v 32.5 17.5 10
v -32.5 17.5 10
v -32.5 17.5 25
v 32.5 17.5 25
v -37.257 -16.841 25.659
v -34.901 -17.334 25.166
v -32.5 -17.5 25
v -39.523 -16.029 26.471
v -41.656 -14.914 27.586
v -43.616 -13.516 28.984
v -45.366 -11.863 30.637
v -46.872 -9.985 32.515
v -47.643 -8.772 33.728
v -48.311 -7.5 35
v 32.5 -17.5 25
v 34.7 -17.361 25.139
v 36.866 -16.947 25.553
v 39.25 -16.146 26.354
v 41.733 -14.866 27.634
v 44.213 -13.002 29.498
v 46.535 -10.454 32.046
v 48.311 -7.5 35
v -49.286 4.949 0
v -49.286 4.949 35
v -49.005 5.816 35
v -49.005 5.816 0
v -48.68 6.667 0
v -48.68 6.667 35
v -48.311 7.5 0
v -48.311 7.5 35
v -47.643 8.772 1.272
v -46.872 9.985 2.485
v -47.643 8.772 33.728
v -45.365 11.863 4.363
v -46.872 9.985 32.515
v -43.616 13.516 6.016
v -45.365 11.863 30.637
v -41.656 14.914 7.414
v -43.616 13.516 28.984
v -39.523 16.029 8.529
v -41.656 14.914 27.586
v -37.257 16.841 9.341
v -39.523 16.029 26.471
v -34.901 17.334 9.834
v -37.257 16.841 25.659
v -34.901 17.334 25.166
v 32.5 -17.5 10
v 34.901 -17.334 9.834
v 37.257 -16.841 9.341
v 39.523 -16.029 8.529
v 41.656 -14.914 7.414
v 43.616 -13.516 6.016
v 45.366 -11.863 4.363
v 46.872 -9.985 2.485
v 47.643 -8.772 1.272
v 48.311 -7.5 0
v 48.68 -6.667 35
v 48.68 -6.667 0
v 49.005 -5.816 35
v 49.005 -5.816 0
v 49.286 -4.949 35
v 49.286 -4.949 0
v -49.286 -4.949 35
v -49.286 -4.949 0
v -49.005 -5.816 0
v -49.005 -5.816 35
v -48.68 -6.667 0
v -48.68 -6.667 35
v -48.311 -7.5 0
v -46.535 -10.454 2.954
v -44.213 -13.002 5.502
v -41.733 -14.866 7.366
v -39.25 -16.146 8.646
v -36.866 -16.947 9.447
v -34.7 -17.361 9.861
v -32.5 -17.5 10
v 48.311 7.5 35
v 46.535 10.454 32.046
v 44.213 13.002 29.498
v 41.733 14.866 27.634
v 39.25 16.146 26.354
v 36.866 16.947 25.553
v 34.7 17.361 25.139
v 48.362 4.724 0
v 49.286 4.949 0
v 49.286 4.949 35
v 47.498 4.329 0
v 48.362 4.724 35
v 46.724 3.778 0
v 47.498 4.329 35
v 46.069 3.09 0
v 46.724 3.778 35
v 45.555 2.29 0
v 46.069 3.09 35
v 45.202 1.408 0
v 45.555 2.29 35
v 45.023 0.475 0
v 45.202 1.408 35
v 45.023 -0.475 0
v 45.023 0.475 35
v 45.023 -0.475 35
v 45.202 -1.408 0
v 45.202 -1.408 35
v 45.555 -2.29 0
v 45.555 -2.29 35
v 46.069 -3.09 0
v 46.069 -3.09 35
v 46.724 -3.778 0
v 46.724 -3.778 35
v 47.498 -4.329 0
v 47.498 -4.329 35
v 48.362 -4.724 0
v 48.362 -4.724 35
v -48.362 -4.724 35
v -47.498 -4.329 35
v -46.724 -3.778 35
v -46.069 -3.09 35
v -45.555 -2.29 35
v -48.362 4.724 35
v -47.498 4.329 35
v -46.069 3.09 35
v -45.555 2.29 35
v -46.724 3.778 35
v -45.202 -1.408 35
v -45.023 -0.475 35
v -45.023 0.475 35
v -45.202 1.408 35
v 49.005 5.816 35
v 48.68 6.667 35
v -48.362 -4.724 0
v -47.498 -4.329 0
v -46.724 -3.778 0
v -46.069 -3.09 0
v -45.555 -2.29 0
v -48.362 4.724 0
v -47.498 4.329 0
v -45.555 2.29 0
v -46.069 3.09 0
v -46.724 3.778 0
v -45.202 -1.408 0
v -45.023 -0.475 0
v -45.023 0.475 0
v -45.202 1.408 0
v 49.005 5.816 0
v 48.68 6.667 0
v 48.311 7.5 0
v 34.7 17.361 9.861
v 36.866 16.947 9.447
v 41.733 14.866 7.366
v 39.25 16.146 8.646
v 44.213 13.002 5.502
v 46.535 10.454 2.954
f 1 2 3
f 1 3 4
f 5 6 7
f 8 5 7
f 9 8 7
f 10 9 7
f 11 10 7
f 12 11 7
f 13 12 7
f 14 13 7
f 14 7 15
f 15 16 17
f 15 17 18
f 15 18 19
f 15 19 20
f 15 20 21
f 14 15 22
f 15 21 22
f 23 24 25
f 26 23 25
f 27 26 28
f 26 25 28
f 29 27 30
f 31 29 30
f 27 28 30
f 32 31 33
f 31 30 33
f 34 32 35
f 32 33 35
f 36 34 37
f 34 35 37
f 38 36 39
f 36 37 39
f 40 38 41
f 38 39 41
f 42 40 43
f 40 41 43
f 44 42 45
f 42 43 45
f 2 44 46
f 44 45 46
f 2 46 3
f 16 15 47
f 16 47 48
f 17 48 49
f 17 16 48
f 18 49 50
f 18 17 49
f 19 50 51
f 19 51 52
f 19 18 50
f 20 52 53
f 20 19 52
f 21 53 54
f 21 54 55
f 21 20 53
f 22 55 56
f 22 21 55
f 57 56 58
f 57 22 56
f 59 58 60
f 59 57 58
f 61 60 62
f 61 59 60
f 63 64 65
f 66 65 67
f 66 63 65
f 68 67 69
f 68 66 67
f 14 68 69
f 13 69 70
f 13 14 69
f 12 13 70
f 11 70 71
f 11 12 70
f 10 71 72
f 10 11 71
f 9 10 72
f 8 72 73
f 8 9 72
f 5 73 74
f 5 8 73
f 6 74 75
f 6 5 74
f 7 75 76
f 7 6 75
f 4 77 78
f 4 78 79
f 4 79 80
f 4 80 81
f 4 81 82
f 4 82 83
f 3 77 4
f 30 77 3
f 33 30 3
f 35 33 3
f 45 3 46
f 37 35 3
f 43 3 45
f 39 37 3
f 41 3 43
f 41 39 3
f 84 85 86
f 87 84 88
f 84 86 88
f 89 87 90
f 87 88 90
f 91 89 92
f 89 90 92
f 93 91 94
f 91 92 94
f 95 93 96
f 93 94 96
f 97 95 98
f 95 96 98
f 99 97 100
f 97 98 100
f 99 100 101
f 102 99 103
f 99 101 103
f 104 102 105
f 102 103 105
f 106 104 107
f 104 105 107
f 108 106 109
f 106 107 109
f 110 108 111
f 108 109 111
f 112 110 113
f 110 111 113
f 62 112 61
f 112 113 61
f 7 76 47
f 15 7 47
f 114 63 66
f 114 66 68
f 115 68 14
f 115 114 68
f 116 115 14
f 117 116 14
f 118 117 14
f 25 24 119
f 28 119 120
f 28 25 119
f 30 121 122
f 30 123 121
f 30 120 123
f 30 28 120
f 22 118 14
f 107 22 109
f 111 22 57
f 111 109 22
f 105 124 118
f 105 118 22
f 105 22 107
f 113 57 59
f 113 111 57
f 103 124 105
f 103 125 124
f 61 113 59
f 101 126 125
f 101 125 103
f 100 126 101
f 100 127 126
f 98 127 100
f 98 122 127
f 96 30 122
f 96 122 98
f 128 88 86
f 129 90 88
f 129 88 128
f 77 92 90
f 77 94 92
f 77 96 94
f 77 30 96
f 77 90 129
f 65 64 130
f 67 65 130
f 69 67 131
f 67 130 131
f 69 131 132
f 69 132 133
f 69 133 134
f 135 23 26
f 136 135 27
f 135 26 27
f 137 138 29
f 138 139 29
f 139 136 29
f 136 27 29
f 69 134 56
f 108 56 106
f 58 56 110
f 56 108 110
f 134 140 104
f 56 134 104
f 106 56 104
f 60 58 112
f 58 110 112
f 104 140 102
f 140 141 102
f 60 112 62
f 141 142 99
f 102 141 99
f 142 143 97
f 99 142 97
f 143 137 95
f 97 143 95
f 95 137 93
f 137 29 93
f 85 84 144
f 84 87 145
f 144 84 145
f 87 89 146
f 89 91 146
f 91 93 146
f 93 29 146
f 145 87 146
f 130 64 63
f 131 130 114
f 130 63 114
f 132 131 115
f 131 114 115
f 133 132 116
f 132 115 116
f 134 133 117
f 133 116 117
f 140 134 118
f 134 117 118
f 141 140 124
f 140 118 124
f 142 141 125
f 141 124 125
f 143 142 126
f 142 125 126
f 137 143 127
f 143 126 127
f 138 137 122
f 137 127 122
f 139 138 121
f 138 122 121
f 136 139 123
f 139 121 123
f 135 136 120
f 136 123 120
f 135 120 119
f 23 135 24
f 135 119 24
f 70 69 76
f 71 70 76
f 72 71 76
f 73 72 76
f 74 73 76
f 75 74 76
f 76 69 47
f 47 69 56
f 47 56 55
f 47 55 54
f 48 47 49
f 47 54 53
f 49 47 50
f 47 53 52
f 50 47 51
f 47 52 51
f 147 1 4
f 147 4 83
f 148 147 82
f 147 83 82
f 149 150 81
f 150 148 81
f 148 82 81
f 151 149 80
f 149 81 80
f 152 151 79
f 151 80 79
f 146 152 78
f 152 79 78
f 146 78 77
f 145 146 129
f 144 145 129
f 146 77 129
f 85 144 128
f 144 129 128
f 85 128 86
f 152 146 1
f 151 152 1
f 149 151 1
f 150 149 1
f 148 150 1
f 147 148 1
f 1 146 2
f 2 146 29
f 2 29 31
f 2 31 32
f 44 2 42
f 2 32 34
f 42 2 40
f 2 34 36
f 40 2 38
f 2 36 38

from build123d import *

# Parameters (mm, degrees)
IZIM1_W                     = 100
IZIM1_H                     = 35
Y_KSEKLIK_EKSTR_ZYON1_DEPTH = 35
RADYUS1_R                   = 17.5
RADYUS2_R                   = 17.5
RADYUS3_R                   = 17.5
IZIM2_R                     = 5
KES_EKSTR_ZYON1_DEPTH       = 64.492125496
PAH2_SIZE                   = 10
PAH3_SIZE                   = 10


# Some blends are built 0.0001 mm under size
with BuildPart() as part:
    # Çizim1 → Yükseklik-Ekstrüzyon1 (new body)
    with BuildSketch(Plane.XY):
        Rectangle(IZIM1_W, IZIM1_H)
    extrude(amount=Y_KSEKLIK_EKSTR_ZYON1_DEPTH)

    # Radyus1
    radyus1_edges = [part.edges().sort_by_distance(p)[0] for p in [
        (-50, 17.5, 17.5),
    ]]
    fillet(radyus1_edges, radius=RADYUS1_R)

    # Radyus2
    radyus2_edges = [part.edges().sort_by_distance(p)[0] for p in [
        (-50, -17.5, 17.5),
    ]]
    fillet(radyus2_edges, radius=RADYUS2_R - 0.0001)  # a hair under: the kernel refuses the full size

    # Radyus3
    radyus3_edges = [part.edges().sort_by_distance(p)[0] for p in [
        (50, -17.5, 17.5),
        (50, 17.5, 17.5),
    ]]
    fillet(radyus3_edges, radius=RADYUS3_R - 0.0001)  # a hair under: the kernel refuses the full size

    # Çizim2 → Kes-Ekstrüzyon1 (cut, through all)
    with BuildSketch(Plane.XY.offset(35)):
        with Locations((-50, 0)):
            Circle(IZIM2_R)
        with Locations((50, 0)):
            Circle(IZIM2_R)
    extrude(amount=-KES_EKSTR_ZYON1_DEPTH, mode=Mode.SUBTRACT)

    # Pah2
    # the kernel refuses this chamfer: 10 mm, written as the material it takes off along each edge
    with BuildSketch(Plane(origin=(-58.21682988, 17.5, 0), x_dir=(0, -0.9996219169112968, -0.027495876610586372), z_dir=(1, 0, 0))) as pah2_piece_1:
        Polygon((PAH2_SIZE * 0.999621916911, -PAH2_SIZE * 0.0274958766106), (-PAH2_SIZE * 0.0274958766106, -PAH2_SIZE * 0.999621916911), (0, 0), align=None)
    extrude(amount=116.433759759, mode=Mode.SUBTRACT)

    # Pah3
    # the kernel refuses this chamfer: 10 mm, written as the material it takes off along each edge
    with BuildSketch(Plane(origin=(58.21692988, -17.5, 0), x_dir=(0, 0.9996219169112968, -0.027495876610586372), z_dir=(-1, 0, 0)), Plane(origin=(58.21692988, -17.5, 35), x_dir=(0, -0.027495876610586317, -0.9996219169112968), z_dir=(-1, 0, 0))) as pah3_piece_1:
        Polygon((PAH3_SIZE * 0.999621916911, -PAH3_SIZE * 0.0274958766106), (-PAH3_SIZE * 0.0274958766106, -PAH3_SIZE * 0.999621916911), (0, 0), align=None)
    extrude(amount=116.433859759, mode=Mode.SUBTRACT)
    with BuildSketch(Plane(origin=(-58.21682988, 17.5, 35), x_dir=(0, -0.9996219169112968, 0.027495876610586317), z_dir=(1, 0, 0))) as pah3_piece_2:
        Polygon((PAH3_SIZE * 0.999621916911, PAH3_SIZE * 0.0274958766106), (-PAH3_SIZE * 0.0274958766106, PAH3_SIZE * 0.999621916911), (0, 0), align=None)
    extrude(amount=116.433759759, mode=Mode.SUBTRACT)


solid = part.part
